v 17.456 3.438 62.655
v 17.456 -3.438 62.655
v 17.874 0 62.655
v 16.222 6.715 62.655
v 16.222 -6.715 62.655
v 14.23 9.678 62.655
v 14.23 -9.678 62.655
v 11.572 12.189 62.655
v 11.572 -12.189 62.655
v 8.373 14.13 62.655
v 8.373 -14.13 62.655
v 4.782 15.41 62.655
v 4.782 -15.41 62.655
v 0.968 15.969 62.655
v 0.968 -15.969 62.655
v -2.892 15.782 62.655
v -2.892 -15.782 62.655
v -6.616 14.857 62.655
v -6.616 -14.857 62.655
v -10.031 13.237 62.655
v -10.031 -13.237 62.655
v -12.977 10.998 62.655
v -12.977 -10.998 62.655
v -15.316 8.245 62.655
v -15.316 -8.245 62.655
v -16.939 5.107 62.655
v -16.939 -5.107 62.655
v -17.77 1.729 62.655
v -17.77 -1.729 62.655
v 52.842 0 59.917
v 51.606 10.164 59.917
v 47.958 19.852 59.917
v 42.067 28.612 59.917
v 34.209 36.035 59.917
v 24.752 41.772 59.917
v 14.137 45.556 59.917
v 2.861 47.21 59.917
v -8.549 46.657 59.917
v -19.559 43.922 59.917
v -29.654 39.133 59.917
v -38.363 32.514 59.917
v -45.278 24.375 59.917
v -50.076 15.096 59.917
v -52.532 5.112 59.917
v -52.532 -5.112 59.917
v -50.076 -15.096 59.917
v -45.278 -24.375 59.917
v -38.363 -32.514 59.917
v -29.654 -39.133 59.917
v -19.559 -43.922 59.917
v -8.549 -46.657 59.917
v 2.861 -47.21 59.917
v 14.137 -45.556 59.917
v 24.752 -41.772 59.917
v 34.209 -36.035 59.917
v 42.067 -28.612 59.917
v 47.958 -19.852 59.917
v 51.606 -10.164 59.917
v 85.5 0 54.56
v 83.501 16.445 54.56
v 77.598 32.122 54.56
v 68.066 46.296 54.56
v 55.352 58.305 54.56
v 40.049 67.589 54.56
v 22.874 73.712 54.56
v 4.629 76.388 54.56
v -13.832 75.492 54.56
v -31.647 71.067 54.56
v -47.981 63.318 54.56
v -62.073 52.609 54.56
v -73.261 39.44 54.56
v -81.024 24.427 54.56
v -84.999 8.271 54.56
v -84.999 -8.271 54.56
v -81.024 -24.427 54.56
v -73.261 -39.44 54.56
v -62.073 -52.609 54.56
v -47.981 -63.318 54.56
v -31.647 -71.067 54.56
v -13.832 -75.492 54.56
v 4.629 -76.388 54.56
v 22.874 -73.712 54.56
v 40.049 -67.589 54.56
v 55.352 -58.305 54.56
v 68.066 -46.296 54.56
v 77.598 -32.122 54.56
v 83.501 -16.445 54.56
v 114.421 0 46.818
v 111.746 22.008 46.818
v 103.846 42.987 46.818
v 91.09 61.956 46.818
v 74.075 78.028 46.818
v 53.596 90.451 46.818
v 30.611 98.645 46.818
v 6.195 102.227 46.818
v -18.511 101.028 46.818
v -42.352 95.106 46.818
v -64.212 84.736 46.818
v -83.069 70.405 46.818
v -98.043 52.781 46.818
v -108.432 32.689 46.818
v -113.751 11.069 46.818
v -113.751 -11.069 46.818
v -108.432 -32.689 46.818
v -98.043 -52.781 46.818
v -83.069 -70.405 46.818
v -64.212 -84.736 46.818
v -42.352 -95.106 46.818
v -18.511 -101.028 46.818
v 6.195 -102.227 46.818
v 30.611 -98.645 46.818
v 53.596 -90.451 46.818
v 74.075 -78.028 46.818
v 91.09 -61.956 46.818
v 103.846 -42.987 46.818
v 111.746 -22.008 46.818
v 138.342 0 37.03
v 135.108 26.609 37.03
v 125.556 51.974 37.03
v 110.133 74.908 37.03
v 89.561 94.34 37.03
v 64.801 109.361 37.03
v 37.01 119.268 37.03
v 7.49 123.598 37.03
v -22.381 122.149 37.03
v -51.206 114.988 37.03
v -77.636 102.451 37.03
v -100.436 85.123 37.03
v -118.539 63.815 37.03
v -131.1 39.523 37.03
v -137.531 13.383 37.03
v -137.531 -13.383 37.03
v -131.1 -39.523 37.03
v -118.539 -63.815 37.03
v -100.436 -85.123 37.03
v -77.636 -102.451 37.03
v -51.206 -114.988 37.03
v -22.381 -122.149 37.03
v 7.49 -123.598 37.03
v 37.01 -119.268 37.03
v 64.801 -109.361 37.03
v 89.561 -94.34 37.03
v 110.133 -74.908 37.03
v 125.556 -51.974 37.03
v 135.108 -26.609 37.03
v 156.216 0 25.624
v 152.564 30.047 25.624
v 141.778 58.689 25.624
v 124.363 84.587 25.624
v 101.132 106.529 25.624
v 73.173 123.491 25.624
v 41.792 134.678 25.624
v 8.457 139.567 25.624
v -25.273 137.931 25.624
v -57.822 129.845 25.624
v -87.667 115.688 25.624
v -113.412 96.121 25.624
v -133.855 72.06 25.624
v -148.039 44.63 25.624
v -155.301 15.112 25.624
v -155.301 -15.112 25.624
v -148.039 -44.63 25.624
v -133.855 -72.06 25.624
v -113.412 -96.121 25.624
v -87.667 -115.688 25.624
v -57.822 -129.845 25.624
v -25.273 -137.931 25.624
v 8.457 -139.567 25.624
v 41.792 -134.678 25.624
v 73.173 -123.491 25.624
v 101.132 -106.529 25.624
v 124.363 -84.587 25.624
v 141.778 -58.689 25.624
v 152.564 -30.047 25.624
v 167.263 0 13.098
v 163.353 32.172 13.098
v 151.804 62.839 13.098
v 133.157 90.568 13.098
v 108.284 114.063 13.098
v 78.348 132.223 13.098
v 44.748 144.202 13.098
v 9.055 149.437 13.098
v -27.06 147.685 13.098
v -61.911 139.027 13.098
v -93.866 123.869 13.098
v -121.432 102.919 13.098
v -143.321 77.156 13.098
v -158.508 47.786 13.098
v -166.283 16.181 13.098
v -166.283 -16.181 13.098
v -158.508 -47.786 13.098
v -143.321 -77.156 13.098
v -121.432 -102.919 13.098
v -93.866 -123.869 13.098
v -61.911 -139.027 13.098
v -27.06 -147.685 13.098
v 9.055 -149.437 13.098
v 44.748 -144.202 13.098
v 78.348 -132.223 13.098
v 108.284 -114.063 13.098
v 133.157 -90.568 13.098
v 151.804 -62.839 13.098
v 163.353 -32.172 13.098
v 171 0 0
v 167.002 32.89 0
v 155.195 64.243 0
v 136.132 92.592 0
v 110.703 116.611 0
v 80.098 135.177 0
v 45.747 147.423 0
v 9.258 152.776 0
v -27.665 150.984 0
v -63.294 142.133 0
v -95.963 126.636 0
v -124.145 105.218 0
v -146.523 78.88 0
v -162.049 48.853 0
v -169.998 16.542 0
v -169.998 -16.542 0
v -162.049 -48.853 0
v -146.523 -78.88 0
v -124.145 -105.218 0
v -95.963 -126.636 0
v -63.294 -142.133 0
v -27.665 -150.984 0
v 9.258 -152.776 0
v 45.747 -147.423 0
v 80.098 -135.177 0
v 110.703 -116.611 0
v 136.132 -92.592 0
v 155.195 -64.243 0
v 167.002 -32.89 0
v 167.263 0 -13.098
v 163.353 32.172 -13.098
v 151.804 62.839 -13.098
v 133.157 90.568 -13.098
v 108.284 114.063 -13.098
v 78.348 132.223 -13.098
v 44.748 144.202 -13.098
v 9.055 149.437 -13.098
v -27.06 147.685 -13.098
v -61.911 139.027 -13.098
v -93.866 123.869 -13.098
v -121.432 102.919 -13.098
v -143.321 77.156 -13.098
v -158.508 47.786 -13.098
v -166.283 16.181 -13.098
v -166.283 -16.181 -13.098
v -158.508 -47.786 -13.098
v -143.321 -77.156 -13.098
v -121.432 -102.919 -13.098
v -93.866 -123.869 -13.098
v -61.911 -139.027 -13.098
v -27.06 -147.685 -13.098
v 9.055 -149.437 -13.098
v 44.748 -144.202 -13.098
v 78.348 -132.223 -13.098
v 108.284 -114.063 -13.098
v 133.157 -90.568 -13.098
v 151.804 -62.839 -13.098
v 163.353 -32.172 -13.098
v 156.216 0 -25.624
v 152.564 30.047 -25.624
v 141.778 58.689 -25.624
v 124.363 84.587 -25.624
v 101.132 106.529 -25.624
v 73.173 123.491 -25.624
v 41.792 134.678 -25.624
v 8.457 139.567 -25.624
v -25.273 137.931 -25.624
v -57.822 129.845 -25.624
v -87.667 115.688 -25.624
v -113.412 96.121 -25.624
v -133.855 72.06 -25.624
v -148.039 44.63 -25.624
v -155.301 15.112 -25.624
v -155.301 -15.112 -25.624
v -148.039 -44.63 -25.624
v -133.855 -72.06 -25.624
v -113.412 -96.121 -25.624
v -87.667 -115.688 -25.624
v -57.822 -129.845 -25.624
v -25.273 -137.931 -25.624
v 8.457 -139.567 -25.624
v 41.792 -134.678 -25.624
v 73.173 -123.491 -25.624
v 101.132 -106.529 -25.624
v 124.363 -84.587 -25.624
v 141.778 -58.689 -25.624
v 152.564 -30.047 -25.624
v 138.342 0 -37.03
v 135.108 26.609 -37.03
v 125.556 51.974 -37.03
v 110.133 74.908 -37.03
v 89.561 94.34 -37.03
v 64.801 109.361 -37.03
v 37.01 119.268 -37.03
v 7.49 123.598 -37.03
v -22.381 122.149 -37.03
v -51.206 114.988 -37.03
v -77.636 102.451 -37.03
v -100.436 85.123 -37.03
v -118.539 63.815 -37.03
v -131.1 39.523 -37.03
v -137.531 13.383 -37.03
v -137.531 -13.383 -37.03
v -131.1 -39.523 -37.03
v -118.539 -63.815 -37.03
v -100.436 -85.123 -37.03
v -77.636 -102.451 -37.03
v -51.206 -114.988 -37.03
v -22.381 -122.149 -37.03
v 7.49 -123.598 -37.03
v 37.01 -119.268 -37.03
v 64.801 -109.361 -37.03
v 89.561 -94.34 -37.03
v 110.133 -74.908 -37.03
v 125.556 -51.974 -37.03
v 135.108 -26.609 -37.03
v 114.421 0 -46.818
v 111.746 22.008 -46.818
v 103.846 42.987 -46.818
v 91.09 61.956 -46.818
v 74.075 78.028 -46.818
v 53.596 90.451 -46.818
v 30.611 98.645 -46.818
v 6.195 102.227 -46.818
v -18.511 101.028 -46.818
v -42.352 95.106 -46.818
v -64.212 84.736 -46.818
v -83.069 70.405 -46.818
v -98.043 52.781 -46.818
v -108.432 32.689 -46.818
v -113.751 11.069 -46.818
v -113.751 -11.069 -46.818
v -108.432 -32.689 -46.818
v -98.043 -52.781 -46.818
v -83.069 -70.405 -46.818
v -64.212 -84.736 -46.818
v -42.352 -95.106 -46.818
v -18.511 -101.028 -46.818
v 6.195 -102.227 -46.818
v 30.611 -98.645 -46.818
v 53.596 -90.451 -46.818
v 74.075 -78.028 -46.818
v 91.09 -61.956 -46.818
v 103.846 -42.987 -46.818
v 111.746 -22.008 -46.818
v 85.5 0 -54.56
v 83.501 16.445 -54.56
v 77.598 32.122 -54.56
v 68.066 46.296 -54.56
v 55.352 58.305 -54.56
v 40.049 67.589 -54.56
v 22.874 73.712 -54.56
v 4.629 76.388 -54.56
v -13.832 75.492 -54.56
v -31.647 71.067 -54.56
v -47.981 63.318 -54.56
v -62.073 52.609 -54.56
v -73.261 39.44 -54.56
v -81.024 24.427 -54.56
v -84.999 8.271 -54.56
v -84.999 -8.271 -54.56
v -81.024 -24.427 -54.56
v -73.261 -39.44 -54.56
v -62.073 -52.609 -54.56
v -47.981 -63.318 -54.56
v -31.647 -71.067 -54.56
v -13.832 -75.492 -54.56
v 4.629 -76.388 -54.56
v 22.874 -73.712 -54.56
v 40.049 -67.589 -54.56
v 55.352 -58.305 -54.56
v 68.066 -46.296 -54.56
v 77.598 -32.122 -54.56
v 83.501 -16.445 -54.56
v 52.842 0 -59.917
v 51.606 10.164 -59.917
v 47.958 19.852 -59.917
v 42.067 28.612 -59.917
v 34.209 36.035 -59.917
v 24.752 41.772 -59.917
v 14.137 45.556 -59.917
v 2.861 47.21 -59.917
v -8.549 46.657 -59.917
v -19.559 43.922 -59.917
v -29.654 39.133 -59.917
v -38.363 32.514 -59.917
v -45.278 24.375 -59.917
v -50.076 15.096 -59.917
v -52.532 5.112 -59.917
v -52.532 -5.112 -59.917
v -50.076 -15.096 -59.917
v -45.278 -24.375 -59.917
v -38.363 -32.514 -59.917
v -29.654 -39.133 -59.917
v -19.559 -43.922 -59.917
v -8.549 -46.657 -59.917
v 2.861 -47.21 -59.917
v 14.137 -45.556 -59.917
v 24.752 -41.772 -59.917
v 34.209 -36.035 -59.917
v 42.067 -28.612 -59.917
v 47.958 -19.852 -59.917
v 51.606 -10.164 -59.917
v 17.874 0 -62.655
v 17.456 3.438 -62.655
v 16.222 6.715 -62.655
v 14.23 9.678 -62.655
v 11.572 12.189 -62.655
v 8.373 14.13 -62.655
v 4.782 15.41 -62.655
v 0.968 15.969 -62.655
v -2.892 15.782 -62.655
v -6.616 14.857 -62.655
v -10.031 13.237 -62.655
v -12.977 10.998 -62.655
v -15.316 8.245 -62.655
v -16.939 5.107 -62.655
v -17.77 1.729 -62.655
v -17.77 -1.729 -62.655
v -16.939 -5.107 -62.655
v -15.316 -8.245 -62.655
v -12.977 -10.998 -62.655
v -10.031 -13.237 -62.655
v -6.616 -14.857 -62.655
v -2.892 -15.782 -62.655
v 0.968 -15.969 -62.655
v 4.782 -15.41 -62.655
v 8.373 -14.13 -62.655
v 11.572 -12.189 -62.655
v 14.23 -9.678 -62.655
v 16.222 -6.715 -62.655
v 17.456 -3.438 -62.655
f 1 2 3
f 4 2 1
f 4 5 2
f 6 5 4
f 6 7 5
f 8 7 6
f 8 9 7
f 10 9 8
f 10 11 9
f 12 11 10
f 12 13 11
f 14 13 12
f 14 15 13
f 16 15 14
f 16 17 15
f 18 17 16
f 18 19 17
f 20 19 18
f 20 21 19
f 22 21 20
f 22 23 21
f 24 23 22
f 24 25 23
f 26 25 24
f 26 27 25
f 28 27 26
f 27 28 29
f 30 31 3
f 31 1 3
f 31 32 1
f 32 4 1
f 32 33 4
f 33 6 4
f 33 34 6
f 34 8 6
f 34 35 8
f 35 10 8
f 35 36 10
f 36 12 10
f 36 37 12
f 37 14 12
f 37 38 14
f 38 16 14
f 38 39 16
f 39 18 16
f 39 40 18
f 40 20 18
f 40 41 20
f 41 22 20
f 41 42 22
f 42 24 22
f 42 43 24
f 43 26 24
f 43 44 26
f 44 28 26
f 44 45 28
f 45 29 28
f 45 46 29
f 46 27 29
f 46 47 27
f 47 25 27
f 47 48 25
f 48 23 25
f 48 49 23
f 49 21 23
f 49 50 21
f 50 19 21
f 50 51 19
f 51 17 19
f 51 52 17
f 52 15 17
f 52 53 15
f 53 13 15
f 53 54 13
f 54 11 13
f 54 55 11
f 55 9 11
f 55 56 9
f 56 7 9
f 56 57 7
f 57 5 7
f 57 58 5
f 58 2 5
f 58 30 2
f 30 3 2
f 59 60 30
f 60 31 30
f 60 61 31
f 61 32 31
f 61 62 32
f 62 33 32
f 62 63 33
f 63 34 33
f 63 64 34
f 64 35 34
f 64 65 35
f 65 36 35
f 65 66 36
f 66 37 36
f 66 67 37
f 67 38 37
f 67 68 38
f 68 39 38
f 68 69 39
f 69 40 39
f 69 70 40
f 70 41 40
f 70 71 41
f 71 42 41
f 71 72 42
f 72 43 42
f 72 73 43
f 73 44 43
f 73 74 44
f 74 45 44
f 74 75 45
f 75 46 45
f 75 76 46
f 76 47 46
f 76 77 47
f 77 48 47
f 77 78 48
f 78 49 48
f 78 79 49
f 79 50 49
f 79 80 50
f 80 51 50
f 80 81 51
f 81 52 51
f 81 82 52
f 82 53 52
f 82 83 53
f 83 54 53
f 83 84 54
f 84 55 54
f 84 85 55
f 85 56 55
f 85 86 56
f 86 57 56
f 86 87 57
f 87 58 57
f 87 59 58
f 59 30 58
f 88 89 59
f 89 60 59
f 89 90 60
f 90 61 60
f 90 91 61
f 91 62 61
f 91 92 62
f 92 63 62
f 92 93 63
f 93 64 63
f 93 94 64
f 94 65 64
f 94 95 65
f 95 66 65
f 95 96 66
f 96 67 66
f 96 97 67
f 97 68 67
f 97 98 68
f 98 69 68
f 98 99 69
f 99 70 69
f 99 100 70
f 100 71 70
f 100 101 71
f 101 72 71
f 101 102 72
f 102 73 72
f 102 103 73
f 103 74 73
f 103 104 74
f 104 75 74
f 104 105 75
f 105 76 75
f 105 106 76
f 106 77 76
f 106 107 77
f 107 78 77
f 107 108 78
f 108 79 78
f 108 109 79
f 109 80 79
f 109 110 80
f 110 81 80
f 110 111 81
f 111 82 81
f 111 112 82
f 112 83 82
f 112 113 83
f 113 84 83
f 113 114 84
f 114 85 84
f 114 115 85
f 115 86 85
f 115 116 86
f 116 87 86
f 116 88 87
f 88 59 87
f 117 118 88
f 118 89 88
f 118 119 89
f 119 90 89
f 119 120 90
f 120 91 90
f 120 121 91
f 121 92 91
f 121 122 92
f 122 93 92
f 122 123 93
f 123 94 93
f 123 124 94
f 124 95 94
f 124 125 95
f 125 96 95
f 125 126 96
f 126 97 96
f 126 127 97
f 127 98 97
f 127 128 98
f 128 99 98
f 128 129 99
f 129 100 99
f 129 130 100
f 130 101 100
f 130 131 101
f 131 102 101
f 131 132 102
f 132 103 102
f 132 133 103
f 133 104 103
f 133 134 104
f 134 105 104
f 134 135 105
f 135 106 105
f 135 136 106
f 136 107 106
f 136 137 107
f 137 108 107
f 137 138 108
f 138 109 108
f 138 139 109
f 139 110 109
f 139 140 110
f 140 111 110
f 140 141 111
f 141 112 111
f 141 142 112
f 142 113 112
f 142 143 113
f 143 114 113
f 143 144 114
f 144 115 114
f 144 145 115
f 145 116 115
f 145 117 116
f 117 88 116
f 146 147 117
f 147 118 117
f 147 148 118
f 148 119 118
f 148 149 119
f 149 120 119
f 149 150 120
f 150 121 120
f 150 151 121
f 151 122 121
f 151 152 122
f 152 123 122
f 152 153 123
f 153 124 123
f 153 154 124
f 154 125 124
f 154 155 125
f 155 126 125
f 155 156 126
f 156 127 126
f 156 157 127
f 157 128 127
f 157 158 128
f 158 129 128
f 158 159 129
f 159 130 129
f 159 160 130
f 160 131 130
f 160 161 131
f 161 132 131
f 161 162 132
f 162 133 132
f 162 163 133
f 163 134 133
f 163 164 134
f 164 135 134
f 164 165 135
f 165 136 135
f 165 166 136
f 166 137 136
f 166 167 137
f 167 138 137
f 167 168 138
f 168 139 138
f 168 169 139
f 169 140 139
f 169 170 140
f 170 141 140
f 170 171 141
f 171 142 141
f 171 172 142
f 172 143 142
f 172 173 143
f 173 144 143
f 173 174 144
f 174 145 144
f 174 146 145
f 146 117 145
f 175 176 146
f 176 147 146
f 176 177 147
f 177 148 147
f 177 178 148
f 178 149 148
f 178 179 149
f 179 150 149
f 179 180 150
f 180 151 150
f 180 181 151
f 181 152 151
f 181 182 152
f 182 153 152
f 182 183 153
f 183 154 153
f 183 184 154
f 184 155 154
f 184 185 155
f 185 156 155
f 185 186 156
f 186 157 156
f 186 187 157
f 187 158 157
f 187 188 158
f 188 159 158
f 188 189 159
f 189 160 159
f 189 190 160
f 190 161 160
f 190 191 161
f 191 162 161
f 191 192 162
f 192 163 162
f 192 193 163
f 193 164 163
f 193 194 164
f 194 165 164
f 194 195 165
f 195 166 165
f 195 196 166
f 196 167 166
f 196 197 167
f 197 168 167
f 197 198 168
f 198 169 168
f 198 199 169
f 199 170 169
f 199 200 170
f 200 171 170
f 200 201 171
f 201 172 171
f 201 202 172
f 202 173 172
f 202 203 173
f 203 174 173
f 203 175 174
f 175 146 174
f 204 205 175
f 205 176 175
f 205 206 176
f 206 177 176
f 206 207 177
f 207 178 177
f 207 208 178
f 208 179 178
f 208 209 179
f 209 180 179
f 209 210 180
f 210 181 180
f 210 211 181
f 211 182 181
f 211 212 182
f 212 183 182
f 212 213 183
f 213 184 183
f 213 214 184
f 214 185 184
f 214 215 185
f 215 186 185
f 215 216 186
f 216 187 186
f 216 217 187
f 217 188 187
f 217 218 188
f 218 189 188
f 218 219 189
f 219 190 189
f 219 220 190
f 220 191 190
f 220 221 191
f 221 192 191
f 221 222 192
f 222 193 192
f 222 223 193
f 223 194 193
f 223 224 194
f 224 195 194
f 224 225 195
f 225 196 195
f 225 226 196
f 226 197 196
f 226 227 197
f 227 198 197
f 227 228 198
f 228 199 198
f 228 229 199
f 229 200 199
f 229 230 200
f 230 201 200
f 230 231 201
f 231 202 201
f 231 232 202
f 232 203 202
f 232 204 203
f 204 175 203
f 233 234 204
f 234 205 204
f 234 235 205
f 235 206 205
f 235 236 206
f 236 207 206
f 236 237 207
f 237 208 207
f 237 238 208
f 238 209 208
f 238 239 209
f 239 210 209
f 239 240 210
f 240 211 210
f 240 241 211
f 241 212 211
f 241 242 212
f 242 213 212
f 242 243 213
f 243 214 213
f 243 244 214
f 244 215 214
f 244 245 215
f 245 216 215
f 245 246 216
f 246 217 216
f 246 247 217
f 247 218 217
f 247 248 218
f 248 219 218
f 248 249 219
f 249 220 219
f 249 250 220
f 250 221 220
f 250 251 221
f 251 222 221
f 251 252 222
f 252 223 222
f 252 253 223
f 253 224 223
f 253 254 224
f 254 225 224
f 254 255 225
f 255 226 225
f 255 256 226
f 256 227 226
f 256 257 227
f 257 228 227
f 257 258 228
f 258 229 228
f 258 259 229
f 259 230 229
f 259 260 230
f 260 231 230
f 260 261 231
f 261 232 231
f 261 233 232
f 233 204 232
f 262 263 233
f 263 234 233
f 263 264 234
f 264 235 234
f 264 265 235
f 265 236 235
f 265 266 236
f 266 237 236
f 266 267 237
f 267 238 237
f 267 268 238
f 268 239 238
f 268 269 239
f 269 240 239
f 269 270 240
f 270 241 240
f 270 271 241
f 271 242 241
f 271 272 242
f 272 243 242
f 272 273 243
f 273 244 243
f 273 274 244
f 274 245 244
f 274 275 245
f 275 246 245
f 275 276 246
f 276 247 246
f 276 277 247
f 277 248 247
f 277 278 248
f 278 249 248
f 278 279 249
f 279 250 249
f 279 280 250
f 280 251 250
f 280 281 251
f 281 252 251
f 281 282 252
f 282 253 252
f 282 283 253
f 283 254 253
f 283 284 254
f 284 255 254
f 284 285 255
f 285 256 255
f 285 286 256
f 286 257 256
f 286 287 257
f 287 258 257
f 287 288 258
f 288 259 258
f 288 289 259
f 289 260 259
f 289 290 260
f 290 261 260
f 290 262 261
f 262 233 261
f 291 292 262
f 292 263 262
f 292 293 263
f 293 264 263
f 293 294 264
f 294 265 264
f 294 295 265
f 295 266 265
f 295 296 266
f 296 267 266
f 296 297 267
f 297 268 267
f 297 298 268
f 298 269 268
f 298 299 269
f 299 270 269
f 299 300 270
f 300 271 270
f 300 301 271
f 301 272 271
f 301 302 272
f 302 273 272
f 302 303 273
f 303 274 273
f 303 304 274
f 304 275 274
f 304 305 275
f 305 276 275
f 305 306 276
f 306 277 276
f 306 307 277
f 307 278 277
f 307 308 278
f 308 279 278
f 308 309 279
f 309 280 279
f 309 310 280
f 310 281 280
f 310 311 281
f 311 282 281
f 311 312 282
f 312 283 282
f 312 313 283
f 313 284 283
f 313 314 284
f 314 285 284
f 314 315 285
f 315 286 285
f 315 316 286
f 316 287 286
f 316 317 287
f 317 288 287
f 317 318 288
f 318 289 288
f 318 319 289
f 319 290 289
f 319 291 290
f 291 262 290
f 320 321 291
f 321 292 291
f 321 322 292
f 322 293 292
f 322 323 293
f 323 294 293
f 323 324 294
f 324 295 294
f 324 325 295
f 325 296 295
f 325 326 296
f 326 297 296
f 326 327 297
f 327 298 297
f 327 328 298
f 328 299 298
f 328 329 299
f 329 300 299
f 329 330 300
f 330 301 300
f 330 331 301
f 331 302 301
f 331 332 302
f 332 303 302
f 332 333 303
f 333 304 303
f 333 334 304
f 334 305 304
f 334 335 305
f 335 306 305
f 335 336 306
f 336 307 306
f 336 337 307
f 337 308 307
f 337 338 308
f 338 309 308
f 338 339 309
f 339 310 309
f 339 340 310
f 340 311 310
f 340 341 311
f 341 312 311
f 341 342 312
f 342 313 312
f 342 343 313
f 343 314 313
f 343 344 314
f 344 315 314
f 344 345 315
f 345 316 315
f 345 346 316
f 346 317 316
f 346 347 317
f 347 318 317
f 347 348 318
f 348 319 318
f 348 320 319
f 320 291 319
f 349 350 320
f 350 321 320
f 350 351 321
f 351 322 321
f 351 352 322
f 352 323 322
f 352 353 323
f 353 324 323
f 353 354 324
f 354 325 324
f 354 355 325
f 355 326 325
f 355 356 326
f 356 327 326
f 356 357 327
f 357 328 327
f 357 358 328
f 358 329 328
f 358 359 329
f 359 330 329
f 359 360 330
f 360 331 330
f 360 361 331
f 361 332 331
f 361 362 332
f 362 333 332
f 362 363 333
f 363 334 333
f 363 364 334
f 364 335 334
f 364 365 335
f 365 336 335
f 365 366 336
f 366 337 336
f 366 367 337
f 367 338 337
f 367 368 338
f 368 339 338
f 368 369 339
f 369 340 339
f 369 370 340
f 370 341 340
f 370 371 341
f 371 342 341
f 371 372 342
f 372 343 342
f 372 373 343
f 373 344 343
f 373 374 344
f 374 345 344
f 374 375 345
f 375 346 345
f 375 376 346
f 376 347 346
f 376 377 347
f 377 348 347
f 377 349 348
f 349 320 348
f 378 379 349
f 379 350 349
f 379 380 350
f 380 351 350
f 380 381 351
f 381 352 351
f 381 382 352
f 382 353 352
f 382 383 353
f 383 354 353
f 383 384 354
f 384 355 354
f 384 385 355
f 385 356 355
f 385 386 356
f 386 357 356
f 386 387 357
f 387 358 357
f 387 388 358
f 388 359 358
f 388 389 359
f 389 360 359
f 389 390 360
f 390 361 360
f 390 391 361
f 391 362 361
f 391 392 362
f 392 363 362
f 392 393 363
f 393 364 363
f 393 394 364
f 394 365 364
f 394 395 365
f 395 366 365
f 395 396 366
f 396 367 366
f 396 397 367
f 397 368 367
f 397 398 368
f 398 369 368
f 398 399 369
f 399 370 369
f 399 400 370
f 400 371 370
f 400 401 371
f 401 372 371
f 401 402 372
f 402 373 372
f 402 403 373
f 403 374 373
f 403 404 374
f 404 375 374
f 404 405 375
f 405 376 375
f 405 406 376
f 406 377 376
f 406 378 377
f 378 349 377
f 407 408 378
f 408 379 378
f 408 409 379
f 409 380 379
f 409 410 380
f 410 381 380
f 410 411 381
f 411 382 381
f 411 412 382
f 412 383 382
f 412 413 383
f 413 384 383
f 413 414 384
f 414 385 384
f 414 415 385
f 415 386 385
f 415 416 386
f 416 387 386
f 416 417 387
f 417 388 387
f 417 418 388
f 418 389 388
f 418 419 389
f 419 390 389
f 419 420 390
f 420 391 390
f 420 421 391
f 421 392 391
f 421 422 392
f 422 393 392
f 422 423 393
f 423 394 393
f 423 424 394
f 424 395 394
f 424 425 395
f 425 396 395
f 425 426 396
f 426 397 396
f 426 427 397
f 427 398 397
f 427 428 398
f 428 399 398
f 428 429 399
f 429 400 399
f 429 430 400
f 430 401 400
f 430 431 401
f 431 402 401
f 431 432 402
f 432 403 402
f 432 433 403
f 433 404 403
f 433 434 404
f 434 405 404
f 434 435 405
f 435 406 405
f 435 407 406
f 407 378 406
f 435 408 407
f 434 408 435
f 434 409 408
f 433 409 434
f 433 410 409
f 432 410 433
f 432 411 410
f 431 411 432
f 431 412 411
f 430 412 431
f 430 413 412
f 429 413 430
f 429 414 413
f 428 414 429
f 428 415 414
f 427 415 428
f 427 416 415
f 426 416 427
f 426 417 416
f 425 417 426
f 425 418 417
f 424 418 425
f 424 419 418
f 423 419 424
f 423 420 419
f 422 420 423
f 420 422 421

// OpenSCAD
// Generated by SolidPython 1.0.1 on 2020-07-29 00:46:54


scale(v = [19, 17, 7]) {
	sphere(r = 9);
}
/***********************************************
*********      SolidPython code:      **********
************************************************
 
# import packages: SolidPython
from solid import *
from solid.utils import *
from itertools import chain, combinations, permutations


class Resize:

    def __init__(self, scad_file):
        self.scad_file = scad_file
        #self.scad_file = import_scad(scad_file)
        # cone/cylinder param:
        self.r1 = 0
        self.r2 = 0
        self.h = 0
        # rectangular prism param:
        self.w = 0
        self.l = 0
        # ellipse param:
        self.r = 0

    # import OpenScad code (file name corresponds to shape)


    # classify shape + parameters
    def assign(self, param1, param2, param3):
        if self.scad_file == 'cone.scad':
            self.r1 = param1
            self.r2 = param2
            self.h = param3
        elif self.scad_file == 'cylinder.scad':
            self.r1 = param1
            self.r2 = param2
            self.h = param3
        elif self.scad_file == 'rectangularPrism.scad':
            self.h = param1
            self.l = param2
            self.w = param3
        else:
            self.r = param1
            self.h = param2

    # resize parameters
    def iterate(self):
        x = range(3, 20, 2)
        i = 1
        if self.scad_file == 'cone.scad':
            tempList = list(permutations(x, 2))
            for temp in tempList:
                param1 = temp[0]
                param2 = temp[1]
                filepath = 'produced_scad_files/' + 'cone' + str(param1) + '_' + str(param2) + '_' + '.scad'
                scad_render_to_file(cylinder(h=param1, r1=param2, r2=0), filepath)

        elif self.scad_file == 'cylinder.scad':
            tempList = list(permutations(x, 3))
            for temp in tempList:
                param1 = temp[0]
                param2 = temp[1]
                filepath = 'produced_scad_files/' + 'cylinder' + str(param1) + '_' + str(param2) + '_' + '.scad'
                scad_render_to_file(cylinder(h=param1, r1=param2, r2=param2), filepath)

        elif self.scad_file == 'rectangularPrism.scad':
            tempList = list(permutations(x, 3))
            for temp in tempList:
                param1 = temp[0]
                param2 = temp[1]
                param3 = temp[2]
                filepath = 'produced_scad_files/' + 'rectangularPrism' + str(param1) + '_' + str(param2) + '_' + str(
                    param3) + '.scad'
                scad_render_to_file(cube(size=(param1, param2, param3)), filepath)

        elif self.scad_file == 'ellipse.scad':
            tempList = list(permutations(x, 4))
            for temp in tempList:
                param1 = temp[0]
                param2 = temp[1]
                param3 = temp[2]
                param4 = temp[3]
                filepath = 'produced_scad_files/' + 'ellipse' + str(param1) + '_' + str(param2) + '_' + str(param3) + '_' + str(param4) + '.scad'
                scad_render_to_file(scale([param1, param2, param3])(sphere(r=param4)), filepath)

    def render_to_scadfile(self):
        scad_render_to_file(scad, 'example.scad') 
 
************************************************/
